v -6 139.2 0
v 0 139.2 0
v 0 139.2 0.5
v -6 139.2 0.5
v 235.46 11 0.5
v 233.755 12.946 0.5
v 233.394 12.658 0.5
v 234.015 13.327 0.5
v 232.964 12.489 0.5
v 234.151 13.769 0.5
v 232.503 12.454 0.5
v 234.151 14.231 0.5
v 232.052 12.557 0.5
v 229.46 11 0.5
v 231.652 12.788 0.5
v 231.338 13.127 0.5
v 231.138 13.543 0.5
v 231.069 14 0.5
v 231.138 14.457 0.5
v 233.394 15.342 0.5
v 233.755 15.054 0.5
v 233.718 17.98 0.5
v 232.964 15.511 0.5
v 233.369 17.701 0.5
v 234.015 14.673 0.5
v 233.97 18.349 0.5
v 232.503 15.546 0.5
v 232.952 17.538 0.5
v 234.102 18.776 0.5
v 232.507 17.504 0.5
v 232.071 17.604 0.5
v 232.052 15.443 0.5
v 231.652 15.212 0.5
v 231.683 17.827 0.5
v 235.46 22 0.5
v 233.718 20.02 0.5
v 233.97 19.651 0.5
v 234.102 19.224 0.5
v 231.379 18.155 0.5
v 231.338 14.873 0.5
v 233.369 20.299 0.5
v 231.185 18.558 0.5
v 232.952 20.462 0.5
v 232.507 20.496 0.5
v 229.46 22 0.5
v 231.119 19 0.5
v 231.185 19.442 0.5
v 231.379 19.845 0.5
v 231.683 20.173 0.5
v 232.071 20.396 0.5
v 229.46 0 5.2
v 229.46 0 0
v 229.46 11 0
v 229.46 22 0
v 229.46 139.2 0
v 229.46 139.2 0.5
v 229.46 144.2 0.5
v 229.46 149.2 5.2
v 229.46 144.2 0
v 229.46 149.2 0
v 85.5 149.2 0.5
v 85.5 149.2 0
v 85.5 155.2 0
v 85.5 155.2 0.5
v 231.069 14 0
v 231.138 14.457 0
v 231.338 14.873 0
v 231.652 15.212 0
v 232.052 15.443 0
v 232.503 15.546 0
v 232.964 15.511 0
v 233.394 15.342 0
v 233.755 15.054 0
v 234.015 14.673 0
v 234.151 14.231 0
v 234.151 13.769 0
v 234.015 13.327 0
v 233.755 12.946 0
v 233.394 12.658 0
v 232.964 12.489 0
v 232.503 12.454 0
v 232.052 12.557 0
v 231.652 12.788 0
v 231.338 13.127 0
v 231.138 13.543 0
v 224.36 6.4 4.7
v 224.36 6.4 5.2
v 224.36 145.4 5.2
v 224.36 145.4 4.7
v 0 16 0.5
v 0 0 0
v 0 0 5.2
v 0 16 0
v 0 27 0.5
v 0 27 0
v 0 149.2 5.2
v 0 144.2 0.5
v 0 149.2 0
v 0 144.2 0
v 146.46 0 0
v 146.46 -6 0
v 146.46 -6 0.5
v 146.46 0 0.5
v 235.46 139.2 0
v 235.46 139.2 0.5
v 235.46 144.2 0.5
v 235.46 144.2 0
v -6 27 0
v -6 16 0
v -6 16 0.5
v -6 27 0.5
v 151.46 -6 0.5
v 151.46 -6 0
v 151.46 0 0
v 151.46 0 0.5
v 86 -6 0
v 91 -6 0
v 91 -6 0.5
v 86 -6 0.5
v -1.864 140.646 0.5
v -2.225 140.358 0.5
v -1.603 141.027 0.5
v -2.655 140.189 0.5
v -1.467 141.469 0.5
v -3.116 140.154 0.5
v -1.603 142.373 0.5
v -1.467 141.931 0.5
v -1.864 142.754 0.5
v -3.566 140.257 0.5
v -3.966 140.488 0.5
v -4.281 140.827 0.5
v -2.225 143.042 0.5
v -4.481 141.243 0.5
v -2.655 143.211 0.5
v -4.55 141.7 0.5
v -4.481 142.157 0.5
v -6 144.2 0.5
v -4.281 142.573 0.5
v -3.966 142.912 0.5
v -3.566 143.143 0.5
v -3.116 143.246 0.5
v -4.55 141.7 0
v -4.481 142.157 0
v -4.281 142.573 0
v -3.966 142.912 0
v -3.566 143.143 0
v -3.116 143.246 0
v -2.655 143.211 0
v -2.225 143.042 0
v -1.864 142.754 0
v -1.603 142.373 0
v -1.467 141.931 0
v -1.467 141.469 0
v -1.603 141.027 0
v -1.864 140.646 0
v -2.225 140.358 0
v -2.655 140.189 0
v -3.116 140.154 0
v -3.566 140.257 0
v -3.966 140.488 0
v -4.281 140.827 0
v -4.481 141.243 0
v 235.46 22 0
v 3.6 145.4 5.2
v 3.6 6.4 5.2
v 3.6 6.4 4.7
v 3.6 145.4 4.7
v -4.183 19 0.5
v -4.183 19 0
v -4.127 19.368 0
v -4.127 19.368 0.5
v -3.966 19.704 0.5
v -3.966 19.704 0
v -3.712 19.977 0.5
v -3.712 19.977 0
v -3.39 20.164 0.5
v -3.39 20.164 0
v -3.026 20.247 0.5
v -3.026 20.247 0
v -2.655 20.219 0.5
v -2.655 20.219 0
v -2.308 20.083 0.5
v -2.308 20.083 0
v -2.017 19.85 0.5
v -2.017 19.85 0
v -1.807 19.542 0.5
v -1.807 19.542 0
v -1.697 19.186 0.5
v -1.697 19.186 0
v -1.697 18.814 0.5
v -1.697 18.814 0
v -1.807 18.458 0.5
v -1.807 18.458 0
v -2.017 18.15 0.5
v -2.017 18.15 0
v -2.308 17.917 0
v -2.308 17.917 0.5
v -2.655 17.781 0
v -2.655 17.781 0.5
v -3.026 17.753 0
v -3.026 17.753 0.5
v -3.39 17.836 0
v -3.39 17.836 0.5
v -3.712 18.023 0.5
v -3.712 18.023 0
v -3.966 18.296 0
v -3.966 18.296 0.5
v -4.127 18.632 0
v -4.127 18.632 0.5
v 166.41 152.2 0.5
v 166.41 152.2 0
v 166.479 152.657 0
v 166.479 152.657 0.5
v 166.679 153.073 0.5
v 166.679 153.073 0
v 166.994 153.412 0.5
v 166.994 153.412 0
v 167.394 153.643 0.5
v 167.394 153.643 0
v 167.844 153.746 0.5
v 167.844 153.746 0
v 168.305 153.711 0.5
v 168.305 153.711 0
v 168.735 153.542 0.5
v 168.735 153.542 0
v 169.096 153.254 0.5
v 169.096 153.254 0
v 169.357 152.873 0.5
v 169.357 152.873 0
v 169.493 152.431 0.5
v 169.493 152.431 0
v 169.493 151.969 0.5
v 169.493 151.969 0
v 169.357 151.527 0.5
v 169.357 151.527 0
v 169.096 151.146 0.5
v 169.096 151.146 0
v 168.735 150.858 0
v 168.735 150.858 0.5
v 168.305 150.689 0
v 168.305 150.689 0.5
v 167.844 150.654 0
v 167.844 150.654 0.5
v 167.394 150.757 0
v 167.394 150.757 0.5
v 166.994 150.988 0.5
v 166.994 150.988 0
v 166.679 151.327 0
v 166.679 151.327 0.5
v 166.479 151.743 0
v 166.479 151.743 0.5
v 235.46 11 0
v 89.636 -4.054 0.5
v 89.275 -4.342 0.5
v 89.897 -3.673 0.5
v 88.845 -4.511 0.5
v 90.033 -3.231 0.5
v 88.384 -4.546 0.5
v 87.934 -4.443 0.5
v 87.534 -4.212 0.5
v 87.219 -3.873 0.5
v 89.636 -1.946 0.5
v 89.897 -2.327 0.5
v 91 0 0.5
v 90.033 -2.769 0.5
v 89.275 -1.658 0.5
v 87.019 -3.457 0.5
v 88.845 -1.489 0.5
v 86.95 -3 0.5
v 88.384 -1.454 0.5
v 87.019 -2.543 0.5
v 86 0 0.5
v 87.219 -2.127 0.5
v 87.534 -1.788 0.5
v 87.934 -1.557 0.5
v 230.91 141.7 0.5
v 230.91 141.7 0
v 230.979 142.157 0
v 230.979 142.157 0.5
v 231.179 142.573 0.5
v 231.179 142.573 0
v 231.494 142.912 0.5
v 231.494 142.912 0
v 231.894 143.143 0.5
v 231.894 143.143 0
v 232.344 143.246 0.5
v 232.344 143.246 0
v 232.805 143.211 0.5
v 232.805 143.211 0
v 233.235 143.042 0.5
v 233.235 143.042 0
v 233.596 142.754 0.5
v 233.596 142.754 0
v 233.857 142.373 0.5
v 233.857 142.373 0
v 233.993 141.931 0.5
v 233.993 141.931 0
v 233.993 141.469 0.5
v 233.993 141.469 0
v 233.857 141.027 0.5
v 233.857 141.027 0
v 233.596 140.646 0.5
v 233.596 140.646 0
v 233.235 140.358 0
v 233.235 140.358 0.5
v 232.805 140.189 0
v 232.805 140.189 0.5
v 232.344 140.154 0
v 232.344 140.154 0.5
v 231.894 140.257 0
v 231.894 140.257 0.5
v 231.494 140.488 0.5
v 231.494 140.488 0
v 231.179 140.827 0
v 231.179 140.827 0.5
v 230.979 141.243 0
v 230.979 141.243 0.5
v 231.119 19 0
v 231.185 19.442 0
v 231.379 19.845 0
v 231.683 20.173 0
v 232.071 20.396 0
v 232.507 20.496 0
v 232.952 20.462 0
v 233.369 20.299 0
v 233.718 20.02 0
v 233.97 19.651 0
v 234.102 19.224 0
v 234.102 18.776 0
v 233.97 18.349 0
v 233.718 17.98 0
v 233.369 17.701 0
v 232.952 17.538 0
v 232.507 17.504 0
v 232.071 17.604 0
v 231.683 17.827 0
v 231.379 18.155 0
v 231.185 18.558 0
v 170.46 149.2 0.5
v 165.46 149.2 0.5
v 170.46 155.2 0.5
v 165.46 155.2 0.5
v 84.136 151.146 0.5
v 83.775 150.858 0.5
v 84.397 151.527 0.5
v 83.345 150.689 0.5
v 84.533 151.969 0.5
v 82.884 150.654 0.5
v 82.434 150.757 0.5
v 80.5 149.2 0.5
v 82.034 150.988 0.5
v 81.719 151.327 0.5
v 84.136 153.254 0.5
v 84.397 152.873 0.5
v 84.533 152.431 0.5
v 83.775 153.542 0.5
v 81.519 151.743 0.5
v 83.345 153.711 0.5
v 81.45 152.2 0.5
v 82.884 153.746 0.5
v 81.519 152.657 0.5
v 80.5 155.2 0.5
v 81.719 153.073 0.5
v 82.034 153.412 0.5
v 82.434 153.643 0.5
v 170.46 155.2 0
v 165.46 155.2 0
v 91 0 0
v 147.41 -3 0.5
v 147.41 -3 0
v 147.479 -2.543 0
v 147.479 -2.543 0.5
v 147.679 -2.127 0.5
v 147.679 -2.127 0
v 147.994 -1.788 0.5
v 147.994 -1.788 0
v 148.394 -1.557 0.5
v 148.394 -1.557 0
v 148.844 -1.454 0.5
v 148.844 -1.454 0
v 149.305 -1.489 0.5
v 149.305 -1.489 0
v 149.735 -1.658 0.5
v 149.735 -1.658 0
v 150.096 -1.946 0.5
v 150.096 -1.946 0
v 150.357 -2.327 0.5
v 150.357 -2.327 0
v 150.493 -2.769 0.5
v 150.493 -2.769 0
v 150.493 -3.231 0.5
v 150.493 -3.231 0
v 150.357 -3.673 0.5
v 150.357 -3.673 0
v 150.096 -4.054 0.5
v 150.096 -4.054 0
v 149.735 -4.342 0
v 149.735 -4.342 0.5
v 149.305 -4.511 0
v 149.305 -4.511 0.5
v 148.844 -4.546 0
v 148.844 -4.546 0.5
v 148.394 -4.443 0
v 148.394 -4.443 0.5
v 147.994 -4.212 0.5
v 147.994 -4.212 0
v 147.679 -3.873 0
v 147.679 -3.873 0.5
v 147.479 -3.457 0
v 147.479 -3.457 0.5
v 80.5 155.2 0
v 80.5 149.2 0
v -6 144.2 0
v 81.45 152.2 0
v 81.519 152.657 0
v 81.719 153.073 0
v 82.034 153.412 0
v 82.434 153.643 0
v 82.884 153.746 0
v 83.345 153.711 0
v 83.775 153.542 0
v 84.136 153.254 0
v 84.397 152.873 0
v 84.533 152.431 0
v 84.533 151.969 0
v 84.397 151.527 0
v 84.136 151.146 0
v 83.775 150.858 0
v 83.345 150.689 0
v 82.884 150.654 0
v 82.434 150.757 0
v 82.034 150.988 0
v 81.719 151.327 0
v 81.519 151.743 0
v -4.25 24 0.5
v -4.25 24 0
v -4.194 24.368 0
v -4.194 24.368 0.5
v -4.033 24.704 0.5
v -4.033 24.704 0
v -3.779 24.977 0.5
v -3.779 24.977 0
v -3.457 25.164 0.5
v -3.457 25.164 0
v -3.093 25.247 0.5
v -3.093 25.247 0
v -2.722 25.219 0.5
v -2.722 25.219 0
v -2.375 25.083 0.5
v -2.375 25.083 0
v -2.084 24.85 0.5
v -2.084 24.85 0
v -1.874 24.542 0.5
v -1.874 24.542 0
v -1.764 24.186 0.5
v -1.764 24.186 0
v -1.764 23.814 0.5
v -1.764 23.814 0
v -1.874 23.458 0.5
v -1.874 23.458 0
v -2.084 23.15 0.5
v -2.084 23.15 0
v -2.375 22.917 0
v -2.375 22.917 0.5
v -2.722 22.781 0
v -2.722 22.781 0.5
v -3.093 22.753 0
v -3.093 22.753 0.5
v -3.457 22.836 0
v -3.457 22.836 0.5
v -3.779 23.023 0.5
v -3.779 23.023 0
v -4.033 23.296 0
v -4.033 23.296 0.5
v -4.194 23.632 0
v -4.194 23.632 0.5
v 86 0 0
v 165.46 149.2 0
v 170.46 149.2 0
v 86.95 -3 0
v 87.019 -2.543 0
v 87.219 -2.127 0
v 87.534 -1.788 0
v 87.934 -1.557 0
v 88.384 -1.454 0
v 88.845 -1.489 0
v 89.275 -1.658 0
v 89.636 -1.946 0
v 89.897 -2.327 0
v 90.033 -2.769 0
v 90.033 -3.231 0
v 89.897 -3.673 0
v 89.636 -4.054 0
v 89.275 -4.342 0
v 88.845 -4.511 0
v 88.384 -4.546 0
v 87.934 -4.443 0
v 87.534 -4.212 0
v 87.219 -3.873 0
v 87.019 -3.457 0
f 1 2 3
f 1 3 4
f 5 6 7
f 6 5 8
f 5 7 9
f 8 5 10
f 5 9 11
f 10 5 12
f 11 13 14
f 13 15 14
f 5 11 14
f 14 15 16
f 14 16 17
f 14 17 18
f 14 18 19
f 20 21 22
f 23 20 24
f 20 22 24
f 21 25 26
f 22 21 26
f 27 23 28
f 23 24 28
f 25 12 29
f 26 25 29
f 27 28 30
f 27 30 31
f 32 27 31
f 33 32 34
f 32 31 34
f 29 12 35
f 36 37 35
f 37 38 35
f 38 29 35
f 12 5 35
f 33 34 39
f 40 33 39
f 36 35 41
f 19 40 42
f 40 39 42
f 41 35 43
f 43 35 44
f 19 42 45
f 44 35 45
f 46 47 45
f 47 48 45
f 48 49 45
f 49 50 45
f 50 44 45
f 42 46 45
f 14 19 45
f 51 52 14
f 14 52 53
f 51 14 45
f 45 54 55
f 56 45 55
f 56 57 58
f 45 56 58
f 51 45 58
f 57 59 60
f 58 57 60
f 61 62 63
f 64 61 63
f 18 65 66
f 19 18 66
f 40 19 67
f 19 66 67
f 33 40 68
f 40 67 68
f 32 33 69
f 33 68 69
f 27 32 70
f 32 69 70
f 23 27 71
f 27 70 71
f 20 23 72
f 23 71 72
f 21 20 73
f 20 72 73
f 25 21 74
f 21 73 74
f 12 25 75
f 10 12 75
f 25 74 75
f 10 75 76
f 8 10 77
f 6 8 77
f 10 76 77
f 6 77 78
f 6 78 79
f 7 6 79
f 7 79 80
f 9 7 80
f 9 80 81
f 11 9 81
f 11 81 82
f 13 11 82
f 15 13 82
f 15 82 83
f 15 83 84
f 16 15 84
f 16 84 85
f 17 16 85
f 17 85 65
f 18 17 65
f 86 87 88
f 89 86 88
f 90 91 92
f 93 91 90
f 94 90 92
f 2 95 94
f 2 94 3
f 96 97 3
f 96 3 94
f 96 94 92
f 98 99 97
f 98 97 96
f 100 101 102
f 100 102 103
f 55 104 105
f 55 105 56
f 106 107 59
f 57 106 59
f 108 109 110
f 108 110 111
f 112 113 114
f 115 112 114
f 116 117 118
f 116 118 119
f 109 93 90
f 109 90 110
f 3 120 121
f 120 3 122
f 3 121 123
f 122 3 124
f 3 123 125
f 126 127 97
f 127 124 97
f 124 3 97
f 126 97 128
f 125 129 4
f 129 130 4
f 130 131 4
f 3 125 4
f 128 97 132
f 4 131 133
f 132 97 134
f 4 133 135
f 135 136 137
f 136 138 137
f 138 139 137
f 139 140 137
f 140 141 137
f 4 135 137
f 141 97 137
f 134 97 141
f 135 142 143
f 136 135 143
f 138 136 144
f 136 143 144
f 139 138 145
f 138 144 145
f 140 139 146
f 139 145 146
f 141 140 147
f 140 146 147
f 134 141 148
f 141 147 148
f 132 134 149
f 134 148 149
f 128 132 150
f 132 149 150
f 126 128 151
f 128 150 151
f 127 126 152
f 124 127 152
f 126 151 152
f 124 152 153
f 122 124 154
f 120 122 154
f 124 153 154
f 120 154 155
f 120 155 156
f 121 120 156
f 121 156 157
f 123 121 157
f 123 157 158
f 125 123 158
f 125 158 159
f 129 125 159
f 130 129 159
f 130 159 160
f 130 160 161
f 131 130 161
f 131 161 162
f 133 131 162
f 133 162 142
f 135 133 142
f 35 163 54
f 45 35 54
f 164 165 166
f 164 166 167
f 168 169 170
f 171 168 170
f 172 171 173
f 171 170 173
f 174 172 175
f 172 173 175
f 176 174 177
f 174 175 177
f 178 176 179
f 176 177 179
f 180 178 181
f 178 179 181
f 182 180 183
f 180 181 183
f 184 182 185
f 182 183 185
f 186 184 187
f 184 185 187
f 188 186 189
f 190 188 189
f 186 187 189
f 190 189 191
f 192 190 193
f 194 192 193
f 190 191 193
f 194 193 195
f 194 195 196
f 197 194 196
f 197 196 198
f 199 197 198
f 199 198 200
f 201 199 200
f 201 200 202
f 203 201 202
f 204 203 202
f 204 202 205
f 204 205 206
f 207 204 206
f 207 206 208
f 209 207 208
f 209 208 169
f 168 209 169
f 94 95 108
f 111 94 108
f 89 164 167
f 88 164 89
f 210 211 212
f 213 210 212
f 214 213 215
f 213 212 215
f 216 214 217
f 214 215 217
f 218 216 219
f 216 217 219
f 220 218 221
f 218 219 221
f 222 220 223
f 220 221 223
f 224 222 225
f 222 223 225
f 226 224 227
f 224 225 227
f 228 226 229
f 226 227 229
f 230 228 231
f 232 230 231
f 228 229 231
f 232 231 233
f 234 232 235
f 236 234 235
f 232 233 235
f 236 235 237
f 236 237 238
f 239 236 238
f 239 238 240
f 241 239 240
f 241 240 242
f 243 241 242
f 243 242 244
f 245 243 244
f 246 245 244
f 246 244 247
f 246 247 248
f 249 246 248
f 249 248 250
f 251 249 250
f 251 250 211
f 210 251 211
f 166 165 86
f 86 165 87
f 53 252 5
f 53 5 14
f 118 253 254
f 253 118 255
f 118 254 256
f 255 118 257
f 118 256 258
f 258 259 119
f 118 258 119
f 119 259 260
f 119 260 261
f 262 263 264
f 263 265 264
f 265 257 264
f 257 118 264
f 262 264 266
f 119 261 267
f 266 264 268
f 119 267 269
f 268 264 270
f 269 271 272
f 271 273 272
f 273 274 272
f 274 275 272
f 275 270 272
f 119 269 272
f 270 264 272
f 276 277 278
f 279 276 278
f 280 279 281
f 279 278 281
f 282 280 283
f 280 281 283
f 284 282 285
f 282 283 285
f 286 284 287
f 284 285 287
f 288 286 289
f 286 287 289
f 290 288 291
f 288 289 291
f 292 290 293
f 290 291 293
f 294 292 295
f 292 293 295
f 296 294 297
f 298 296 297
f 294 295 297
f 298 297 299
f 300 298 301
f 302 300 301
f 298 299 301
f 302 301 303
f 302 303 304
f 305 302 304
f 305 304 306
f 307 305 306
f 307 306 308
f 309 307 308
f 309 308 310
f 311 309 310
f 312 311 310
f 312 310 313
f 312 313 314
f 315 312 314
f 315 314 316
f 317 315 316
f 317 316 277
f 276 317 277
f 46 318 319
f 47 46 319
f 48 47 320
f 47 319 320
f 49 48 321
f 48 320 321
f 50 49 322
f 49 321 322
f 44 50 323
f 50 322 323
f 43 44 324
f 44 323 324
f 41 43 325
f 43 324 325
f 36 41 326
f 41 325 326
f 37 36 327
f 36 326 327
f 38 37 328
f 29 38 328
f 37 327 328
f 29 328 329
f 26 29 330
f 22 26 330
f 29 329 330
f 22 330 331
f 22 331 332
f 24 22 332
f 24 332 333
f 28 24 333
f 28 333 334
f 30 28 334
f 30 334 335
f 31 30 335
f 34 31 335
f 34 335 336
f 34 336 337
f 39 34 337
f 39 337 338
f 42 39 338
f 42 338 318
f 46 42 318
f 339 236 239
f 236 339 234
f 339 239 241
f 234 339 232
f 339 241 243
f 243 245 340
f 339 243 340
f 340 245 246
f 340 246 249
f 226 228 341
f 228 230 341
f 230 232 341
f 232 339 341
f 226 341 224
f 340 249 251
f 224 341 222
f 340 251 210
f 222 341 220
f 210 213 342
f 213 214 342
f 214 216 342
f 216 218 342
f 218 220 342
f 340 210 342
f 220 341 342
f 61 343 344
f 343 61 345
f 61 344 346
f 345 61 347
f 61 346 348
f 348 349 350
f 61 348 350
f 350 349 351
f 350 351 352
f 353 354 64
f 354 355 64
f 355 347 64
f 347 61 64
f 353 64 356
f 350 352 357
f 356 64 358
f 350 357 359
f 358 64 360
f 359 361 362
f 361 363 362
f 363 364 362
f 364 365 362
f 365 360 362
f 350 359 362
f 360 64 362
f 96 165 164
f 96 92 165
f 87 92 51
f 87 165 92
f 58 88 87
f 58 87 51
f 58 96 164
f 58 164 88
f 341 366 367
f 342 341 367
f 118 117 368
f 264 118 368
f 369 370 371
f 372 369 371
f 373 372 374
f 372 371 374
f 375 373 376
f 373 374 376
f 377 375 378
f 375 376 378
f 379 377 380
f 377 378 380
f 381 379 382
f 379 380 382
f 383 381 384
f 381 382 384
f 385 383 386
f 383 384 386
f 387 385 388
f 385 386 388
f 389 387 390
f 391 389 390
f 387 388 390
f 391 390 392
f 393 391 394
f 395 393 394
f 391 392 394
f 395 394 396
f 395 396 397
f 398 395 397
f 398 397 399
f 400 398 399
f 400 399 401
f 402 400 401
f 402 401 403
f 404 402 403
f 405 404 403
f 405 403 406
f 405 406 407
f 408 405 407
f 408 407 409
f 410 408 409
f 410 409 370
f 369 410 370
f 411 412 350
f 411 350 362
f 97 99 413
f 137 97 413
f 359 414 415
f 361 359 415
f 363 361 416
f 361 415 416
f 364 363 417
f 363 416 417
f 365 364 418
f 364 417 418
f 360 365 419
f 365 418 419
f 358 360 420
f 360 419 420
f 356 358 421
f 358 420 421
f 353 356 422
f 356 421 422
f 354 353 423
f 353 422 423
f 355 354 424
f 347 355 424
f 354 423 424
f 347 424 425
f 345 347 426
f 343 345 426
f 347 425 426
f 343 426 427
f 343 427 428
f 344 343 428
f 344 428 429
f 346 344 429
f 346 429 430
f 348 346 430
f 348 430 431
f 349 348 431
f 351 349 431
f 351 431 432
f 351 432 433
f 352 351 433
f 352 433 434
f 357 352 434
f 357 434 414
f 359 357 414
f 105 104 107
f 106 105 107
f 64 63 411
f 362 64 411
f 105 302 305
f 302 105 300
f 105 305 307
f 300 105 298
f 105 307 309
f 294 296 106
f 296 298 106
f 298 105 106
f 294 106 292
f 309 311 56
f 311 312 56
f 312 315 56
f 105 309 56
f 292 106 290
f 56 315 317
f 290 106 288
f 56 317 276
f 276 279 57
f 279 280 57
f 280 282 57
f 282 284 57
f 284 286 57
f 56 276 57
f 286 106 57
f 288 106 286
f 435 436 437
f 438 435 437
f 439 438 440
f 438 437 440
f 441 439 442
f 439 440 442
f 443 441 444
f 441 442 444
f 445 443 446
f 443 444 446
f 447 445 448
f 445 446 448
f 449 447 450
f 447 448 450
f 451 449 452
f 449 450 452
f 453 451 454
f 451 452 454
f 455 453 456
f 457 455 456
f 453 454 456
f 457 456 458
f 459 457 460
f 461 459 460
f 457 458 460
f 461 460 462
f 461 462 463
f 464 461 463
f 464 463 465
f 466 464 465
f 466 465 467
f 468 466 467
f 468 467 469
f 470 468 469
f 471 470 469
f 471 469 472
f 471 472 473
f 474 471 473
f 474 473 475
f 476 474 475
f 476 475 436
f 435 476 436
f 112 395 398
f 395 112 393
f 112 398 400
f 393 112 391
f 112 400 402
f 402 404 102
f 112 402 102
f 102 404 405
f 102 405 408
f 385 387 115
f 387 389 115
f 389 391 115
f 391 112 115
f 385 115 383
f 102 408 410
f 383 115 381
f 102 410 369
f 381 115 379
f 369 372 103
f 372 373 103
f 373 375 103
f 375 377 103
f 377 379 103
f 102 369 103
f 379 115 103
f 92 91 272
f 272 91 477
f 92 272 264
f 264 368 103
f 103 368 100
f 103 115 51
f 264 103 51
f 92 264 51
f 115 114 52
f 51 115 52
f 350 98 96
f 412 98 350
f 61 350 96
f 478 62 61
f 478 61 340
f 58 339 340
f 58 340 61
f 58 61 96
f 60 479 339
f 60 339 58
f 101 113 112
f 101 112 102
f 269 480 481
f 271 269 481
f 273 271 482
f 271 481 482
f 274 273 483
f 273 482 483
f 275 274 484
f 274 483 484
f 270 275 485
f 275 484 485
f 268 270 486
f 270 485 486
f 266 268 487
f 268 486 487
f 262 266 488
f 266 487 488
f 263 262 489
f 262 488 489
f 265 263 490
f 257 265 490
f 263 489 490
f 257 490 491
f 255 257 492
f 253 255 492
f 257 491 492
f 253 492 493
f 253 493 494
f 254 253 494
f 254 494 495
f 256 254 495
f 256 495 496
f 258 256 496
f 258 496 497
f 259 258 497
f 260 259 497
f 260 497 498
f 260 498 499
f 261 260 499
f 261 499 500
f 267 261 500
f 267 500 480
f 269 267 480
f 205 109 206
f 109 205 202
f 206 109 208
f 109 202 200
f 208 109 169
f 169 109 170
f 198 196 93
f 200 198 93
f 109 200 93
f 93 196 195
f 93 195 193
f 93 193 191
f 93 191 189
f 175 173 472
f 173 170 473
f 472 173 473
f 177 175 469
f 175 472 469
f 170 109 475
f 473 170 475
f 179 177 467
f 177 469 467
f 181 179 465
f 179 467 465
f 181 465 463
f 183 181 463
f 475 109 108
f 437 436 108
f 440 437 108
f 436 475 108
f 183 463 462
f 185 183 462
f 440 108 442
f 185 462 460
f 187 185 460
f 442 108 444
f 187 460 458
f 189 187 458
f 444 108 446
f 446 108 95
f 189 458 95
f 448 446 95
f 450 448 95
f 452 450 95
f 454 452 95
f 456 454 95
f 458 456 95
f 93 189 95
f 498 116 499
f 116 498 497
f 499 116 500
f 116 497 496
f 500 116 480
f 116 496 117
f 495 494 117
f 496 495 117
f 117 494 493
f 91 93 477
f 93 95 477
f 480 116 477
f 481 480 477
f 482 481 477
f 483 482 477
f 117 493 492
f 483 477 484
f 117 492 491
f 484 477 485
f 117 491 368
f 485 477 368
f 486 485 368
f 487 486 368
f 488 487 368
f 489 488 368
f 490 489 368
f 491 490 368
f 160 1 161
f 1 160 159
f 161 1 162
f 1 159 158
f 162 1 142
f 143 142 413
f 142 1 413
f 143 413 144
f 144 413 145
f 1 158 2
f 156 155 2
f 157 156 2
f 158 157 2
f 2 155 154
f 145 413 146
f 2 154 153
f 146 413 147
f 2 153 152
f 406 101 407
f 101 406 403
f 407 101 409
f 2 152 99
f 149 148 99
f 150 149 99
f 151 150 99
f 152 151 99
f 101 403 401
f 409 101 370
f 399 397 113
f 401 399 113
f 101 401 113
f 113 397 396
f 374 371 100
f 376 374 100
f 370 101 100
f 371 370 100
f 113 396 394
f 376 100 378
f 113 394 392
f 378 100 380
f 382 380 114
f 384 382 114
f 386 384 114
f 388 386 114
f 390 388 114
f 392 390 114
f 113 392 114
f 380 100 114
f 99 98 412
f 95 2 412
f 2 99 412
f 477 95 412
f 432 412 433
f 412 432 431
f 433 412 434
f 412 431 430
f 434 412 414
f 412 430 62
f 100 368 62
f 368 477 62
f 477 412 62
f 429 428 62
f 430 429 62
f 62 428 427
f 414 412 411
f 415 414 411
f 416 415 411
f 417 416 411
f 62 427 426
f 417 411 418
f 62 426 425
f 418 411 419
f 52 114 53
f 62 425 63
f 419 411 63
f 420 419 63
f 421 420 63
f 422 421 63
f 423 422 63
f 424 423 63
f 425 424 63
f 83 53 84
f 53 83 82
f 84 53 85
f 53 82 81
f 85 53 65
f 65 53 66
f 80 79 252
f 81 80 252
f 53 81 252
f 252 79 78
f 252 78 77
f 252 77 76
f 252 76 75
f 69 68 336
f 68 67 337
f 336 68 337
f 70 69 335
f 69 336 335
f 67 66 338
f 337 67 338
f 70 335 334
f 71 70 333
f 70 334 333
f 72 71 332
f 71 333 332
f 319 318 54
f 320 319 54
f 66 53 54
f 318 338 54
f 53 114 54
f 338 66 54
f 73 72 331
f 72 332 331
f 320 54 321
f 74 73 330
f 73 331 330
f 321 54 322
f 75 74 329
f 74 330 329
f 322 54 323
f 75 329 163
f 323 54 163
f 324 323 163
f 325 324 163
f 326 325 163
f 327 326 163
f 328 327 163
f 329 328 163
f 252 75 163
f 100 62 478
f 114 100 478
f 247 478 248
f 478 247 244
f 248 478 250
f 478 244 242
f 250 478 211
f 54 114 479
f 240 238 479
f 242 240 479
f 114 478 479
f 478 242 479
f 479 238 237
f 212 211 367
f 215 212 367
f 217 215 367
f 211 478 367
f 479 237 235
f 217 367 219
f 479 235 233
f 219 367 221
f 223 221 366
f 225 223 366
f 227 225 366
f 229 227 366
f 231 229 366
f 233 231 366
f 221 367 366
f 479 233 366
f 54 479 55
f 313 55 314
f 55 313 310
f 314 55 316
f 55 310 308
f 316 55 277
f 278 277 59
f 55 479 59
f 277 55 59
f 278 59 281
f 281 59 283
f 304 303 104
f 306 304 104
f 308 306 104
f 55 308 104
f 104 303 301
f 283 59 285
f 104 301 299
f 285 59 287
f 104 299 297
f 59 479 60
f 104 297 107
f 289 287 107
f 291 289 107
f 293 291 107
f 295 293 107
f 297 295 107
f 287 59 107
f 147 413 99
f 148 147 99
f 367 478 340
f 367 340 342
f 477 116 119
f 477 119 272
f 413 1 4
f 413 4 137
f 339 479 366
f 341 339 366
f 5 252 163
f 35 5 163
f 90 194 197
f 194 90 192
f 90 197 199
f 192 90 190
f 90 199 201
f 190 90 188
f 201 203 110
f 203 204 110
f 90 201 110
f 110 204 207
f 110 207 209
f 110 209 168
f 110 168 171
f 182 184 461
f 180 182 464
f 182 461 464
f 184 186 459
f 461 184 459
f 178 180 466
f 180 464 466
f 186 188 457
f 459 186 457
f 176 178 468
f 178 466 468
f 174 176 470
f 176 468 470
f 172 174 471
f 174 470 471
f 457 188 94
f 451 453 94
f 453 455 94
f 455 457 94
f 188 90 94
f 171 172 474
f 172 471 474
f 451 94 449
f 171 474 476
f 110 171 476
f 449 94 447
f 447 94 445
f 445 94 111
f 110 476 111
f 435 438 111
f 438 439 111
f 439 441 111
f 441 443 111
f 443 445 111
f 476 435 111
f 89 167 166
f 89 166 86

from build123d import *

# Parameters (mm, degrees)
SKETCH1_W                  = 229.46
SKETCH1_H                  = 149.2
BOSS_EXTRUDE1_DEPTH        = 5.2
SKETCH2_W                  = 220.76
SKETCH2_H                  = 139
CUT_EXTRUDE1_DEPTH         = 0.5
SKETCH3_W                  = 6
SKETCH3_H                  = 5
SKETCH3_H_2                = 11
SKETCH3_W_2                = 5
SKETCH3_H_3                = 6
BOSS_EXTRUDE2_DEPTH        = 0.5
SKETCH4_W                  = 5
SKETCH4_H                  = 6
BOSS_EXTRUDE3_DEPTH        = 0.5
F_3_1_3_1_DIAMETER_HOLE1_D = 3.1
F_3_1_3_1_DIAMETER_HOLE4_D = 3.1
F_2_5_2_5_DIAMETER_HOLE2_D = 2.5
F_3_0_3_DIAMETER_HOLE1_D   = 3


with BuildPart() as part:
    # Sketch1 → Boss-Extrude1 (new body)
    with BuildSketch(Plane.XY):
        with Locations((114.73, 74.6)):
            Rectangle(SKETCH1_W, SKETCH1_H)
    extrude(amount=BOSS_EXTRUDE1_DEPTH)

    # Sketch2 → Cut-Extrude1 (cut)
    with BuildSketch(Plane.XY.offset(5.2)):
        with Locations((113.98, 75.9)):
            Rectangle(SKETCH2_W, SKETCH2_H)
    extrude(amount=-CUT_EXTRUDE1_DEPTH, mode=Mode.SUBTRACT)

    # Sketch3 → Boss-Extrude2 (add)
    with BuildSketch(Plane(origin=(0, 0, 0), x_dir=(-1, 0, 0), z_dir=(0, 0, -1))):
        with Locations((-232.46, 141.7)):
            Rectangle(SKETCH3_W, SKETCH3_H)
        with Locations((-232.46, 16.5)):
            Rectangle(SKETCH3_W, SKETCH3_H_2)
        with Locations((-148.96, -3)):
            Rectangle(SKETCH3_W_2, SKETCH3_H_3)
        with Locations((-88.5, -3)):
            Rectangle(SKETCH3_W_2, SKETCH3_H_3)
        with Locations((3, 21.5)):
            Rectangle(SKETCH3_W, SKETCH3_H_2)
        with Locations((3, 141.7)):
            Rectangle(SKETCH3_W, SKETCH3_H)
    extrude(amount=-BOSS_EXTRUDE2_DEPTH)

    # Sketch4 → Boss-Extrude3 (add)
    with BuildSketch(Plane(origin=(0, 0, 0), x_dir=(-1, 0, 0), z_dir=(0, 0, -1))):
        with Locations((-167.96, 152.2)):
            Rectangle(SKETCH4_W, SKETCH4_H)
        with Locations((-83, 152.2)):
            Rectangle(SKETCH4_W, SKETCH4_H)
    extrude(amount=-BOSS_EXTRUDE3_DEPTH)

    # Ø3.1 (3.1) Diameter Hole1 (through all)
    with Locations(Plane.XY.offset(0.5)):
        with Locations((-3, 141.7), (83, 152.2), (167.96, 152.2), (232.46, 141.7), (148.96, -3), (88.5, -3)):
            Hole(F_3_1_3_1_DIAMETER_HOLE1_D / 2)

    # Ø3.1 (3.1) Diameter Hole4 (through all)
    with Locations(Plane.XY.offset(0.5)):
        with Locations((232.618638534, 14)):
            Hole(F_3_1_3_1_DIAMETER_HOLE4_D / 2)

    # Ø2.5 (2.5) Diameter Hole2 (through all)
    with Locations(Plane.XY.offset(0.5)):
        with Locations((-3, 24), (-2.932911523, 19)):
            Hole(F_2_5_2_5_DIAMETER_HOLE2_D / 2)

    # Ø3.0 (3) Diameter Hole1 (through all)
    with Locations(Plane.XY.offset(0.5)):
        with Locations((232.618638534, 19)):
            Hole(F_3_0_3_DIAMETER_HOLE1_D / 2)


solid = part.part
